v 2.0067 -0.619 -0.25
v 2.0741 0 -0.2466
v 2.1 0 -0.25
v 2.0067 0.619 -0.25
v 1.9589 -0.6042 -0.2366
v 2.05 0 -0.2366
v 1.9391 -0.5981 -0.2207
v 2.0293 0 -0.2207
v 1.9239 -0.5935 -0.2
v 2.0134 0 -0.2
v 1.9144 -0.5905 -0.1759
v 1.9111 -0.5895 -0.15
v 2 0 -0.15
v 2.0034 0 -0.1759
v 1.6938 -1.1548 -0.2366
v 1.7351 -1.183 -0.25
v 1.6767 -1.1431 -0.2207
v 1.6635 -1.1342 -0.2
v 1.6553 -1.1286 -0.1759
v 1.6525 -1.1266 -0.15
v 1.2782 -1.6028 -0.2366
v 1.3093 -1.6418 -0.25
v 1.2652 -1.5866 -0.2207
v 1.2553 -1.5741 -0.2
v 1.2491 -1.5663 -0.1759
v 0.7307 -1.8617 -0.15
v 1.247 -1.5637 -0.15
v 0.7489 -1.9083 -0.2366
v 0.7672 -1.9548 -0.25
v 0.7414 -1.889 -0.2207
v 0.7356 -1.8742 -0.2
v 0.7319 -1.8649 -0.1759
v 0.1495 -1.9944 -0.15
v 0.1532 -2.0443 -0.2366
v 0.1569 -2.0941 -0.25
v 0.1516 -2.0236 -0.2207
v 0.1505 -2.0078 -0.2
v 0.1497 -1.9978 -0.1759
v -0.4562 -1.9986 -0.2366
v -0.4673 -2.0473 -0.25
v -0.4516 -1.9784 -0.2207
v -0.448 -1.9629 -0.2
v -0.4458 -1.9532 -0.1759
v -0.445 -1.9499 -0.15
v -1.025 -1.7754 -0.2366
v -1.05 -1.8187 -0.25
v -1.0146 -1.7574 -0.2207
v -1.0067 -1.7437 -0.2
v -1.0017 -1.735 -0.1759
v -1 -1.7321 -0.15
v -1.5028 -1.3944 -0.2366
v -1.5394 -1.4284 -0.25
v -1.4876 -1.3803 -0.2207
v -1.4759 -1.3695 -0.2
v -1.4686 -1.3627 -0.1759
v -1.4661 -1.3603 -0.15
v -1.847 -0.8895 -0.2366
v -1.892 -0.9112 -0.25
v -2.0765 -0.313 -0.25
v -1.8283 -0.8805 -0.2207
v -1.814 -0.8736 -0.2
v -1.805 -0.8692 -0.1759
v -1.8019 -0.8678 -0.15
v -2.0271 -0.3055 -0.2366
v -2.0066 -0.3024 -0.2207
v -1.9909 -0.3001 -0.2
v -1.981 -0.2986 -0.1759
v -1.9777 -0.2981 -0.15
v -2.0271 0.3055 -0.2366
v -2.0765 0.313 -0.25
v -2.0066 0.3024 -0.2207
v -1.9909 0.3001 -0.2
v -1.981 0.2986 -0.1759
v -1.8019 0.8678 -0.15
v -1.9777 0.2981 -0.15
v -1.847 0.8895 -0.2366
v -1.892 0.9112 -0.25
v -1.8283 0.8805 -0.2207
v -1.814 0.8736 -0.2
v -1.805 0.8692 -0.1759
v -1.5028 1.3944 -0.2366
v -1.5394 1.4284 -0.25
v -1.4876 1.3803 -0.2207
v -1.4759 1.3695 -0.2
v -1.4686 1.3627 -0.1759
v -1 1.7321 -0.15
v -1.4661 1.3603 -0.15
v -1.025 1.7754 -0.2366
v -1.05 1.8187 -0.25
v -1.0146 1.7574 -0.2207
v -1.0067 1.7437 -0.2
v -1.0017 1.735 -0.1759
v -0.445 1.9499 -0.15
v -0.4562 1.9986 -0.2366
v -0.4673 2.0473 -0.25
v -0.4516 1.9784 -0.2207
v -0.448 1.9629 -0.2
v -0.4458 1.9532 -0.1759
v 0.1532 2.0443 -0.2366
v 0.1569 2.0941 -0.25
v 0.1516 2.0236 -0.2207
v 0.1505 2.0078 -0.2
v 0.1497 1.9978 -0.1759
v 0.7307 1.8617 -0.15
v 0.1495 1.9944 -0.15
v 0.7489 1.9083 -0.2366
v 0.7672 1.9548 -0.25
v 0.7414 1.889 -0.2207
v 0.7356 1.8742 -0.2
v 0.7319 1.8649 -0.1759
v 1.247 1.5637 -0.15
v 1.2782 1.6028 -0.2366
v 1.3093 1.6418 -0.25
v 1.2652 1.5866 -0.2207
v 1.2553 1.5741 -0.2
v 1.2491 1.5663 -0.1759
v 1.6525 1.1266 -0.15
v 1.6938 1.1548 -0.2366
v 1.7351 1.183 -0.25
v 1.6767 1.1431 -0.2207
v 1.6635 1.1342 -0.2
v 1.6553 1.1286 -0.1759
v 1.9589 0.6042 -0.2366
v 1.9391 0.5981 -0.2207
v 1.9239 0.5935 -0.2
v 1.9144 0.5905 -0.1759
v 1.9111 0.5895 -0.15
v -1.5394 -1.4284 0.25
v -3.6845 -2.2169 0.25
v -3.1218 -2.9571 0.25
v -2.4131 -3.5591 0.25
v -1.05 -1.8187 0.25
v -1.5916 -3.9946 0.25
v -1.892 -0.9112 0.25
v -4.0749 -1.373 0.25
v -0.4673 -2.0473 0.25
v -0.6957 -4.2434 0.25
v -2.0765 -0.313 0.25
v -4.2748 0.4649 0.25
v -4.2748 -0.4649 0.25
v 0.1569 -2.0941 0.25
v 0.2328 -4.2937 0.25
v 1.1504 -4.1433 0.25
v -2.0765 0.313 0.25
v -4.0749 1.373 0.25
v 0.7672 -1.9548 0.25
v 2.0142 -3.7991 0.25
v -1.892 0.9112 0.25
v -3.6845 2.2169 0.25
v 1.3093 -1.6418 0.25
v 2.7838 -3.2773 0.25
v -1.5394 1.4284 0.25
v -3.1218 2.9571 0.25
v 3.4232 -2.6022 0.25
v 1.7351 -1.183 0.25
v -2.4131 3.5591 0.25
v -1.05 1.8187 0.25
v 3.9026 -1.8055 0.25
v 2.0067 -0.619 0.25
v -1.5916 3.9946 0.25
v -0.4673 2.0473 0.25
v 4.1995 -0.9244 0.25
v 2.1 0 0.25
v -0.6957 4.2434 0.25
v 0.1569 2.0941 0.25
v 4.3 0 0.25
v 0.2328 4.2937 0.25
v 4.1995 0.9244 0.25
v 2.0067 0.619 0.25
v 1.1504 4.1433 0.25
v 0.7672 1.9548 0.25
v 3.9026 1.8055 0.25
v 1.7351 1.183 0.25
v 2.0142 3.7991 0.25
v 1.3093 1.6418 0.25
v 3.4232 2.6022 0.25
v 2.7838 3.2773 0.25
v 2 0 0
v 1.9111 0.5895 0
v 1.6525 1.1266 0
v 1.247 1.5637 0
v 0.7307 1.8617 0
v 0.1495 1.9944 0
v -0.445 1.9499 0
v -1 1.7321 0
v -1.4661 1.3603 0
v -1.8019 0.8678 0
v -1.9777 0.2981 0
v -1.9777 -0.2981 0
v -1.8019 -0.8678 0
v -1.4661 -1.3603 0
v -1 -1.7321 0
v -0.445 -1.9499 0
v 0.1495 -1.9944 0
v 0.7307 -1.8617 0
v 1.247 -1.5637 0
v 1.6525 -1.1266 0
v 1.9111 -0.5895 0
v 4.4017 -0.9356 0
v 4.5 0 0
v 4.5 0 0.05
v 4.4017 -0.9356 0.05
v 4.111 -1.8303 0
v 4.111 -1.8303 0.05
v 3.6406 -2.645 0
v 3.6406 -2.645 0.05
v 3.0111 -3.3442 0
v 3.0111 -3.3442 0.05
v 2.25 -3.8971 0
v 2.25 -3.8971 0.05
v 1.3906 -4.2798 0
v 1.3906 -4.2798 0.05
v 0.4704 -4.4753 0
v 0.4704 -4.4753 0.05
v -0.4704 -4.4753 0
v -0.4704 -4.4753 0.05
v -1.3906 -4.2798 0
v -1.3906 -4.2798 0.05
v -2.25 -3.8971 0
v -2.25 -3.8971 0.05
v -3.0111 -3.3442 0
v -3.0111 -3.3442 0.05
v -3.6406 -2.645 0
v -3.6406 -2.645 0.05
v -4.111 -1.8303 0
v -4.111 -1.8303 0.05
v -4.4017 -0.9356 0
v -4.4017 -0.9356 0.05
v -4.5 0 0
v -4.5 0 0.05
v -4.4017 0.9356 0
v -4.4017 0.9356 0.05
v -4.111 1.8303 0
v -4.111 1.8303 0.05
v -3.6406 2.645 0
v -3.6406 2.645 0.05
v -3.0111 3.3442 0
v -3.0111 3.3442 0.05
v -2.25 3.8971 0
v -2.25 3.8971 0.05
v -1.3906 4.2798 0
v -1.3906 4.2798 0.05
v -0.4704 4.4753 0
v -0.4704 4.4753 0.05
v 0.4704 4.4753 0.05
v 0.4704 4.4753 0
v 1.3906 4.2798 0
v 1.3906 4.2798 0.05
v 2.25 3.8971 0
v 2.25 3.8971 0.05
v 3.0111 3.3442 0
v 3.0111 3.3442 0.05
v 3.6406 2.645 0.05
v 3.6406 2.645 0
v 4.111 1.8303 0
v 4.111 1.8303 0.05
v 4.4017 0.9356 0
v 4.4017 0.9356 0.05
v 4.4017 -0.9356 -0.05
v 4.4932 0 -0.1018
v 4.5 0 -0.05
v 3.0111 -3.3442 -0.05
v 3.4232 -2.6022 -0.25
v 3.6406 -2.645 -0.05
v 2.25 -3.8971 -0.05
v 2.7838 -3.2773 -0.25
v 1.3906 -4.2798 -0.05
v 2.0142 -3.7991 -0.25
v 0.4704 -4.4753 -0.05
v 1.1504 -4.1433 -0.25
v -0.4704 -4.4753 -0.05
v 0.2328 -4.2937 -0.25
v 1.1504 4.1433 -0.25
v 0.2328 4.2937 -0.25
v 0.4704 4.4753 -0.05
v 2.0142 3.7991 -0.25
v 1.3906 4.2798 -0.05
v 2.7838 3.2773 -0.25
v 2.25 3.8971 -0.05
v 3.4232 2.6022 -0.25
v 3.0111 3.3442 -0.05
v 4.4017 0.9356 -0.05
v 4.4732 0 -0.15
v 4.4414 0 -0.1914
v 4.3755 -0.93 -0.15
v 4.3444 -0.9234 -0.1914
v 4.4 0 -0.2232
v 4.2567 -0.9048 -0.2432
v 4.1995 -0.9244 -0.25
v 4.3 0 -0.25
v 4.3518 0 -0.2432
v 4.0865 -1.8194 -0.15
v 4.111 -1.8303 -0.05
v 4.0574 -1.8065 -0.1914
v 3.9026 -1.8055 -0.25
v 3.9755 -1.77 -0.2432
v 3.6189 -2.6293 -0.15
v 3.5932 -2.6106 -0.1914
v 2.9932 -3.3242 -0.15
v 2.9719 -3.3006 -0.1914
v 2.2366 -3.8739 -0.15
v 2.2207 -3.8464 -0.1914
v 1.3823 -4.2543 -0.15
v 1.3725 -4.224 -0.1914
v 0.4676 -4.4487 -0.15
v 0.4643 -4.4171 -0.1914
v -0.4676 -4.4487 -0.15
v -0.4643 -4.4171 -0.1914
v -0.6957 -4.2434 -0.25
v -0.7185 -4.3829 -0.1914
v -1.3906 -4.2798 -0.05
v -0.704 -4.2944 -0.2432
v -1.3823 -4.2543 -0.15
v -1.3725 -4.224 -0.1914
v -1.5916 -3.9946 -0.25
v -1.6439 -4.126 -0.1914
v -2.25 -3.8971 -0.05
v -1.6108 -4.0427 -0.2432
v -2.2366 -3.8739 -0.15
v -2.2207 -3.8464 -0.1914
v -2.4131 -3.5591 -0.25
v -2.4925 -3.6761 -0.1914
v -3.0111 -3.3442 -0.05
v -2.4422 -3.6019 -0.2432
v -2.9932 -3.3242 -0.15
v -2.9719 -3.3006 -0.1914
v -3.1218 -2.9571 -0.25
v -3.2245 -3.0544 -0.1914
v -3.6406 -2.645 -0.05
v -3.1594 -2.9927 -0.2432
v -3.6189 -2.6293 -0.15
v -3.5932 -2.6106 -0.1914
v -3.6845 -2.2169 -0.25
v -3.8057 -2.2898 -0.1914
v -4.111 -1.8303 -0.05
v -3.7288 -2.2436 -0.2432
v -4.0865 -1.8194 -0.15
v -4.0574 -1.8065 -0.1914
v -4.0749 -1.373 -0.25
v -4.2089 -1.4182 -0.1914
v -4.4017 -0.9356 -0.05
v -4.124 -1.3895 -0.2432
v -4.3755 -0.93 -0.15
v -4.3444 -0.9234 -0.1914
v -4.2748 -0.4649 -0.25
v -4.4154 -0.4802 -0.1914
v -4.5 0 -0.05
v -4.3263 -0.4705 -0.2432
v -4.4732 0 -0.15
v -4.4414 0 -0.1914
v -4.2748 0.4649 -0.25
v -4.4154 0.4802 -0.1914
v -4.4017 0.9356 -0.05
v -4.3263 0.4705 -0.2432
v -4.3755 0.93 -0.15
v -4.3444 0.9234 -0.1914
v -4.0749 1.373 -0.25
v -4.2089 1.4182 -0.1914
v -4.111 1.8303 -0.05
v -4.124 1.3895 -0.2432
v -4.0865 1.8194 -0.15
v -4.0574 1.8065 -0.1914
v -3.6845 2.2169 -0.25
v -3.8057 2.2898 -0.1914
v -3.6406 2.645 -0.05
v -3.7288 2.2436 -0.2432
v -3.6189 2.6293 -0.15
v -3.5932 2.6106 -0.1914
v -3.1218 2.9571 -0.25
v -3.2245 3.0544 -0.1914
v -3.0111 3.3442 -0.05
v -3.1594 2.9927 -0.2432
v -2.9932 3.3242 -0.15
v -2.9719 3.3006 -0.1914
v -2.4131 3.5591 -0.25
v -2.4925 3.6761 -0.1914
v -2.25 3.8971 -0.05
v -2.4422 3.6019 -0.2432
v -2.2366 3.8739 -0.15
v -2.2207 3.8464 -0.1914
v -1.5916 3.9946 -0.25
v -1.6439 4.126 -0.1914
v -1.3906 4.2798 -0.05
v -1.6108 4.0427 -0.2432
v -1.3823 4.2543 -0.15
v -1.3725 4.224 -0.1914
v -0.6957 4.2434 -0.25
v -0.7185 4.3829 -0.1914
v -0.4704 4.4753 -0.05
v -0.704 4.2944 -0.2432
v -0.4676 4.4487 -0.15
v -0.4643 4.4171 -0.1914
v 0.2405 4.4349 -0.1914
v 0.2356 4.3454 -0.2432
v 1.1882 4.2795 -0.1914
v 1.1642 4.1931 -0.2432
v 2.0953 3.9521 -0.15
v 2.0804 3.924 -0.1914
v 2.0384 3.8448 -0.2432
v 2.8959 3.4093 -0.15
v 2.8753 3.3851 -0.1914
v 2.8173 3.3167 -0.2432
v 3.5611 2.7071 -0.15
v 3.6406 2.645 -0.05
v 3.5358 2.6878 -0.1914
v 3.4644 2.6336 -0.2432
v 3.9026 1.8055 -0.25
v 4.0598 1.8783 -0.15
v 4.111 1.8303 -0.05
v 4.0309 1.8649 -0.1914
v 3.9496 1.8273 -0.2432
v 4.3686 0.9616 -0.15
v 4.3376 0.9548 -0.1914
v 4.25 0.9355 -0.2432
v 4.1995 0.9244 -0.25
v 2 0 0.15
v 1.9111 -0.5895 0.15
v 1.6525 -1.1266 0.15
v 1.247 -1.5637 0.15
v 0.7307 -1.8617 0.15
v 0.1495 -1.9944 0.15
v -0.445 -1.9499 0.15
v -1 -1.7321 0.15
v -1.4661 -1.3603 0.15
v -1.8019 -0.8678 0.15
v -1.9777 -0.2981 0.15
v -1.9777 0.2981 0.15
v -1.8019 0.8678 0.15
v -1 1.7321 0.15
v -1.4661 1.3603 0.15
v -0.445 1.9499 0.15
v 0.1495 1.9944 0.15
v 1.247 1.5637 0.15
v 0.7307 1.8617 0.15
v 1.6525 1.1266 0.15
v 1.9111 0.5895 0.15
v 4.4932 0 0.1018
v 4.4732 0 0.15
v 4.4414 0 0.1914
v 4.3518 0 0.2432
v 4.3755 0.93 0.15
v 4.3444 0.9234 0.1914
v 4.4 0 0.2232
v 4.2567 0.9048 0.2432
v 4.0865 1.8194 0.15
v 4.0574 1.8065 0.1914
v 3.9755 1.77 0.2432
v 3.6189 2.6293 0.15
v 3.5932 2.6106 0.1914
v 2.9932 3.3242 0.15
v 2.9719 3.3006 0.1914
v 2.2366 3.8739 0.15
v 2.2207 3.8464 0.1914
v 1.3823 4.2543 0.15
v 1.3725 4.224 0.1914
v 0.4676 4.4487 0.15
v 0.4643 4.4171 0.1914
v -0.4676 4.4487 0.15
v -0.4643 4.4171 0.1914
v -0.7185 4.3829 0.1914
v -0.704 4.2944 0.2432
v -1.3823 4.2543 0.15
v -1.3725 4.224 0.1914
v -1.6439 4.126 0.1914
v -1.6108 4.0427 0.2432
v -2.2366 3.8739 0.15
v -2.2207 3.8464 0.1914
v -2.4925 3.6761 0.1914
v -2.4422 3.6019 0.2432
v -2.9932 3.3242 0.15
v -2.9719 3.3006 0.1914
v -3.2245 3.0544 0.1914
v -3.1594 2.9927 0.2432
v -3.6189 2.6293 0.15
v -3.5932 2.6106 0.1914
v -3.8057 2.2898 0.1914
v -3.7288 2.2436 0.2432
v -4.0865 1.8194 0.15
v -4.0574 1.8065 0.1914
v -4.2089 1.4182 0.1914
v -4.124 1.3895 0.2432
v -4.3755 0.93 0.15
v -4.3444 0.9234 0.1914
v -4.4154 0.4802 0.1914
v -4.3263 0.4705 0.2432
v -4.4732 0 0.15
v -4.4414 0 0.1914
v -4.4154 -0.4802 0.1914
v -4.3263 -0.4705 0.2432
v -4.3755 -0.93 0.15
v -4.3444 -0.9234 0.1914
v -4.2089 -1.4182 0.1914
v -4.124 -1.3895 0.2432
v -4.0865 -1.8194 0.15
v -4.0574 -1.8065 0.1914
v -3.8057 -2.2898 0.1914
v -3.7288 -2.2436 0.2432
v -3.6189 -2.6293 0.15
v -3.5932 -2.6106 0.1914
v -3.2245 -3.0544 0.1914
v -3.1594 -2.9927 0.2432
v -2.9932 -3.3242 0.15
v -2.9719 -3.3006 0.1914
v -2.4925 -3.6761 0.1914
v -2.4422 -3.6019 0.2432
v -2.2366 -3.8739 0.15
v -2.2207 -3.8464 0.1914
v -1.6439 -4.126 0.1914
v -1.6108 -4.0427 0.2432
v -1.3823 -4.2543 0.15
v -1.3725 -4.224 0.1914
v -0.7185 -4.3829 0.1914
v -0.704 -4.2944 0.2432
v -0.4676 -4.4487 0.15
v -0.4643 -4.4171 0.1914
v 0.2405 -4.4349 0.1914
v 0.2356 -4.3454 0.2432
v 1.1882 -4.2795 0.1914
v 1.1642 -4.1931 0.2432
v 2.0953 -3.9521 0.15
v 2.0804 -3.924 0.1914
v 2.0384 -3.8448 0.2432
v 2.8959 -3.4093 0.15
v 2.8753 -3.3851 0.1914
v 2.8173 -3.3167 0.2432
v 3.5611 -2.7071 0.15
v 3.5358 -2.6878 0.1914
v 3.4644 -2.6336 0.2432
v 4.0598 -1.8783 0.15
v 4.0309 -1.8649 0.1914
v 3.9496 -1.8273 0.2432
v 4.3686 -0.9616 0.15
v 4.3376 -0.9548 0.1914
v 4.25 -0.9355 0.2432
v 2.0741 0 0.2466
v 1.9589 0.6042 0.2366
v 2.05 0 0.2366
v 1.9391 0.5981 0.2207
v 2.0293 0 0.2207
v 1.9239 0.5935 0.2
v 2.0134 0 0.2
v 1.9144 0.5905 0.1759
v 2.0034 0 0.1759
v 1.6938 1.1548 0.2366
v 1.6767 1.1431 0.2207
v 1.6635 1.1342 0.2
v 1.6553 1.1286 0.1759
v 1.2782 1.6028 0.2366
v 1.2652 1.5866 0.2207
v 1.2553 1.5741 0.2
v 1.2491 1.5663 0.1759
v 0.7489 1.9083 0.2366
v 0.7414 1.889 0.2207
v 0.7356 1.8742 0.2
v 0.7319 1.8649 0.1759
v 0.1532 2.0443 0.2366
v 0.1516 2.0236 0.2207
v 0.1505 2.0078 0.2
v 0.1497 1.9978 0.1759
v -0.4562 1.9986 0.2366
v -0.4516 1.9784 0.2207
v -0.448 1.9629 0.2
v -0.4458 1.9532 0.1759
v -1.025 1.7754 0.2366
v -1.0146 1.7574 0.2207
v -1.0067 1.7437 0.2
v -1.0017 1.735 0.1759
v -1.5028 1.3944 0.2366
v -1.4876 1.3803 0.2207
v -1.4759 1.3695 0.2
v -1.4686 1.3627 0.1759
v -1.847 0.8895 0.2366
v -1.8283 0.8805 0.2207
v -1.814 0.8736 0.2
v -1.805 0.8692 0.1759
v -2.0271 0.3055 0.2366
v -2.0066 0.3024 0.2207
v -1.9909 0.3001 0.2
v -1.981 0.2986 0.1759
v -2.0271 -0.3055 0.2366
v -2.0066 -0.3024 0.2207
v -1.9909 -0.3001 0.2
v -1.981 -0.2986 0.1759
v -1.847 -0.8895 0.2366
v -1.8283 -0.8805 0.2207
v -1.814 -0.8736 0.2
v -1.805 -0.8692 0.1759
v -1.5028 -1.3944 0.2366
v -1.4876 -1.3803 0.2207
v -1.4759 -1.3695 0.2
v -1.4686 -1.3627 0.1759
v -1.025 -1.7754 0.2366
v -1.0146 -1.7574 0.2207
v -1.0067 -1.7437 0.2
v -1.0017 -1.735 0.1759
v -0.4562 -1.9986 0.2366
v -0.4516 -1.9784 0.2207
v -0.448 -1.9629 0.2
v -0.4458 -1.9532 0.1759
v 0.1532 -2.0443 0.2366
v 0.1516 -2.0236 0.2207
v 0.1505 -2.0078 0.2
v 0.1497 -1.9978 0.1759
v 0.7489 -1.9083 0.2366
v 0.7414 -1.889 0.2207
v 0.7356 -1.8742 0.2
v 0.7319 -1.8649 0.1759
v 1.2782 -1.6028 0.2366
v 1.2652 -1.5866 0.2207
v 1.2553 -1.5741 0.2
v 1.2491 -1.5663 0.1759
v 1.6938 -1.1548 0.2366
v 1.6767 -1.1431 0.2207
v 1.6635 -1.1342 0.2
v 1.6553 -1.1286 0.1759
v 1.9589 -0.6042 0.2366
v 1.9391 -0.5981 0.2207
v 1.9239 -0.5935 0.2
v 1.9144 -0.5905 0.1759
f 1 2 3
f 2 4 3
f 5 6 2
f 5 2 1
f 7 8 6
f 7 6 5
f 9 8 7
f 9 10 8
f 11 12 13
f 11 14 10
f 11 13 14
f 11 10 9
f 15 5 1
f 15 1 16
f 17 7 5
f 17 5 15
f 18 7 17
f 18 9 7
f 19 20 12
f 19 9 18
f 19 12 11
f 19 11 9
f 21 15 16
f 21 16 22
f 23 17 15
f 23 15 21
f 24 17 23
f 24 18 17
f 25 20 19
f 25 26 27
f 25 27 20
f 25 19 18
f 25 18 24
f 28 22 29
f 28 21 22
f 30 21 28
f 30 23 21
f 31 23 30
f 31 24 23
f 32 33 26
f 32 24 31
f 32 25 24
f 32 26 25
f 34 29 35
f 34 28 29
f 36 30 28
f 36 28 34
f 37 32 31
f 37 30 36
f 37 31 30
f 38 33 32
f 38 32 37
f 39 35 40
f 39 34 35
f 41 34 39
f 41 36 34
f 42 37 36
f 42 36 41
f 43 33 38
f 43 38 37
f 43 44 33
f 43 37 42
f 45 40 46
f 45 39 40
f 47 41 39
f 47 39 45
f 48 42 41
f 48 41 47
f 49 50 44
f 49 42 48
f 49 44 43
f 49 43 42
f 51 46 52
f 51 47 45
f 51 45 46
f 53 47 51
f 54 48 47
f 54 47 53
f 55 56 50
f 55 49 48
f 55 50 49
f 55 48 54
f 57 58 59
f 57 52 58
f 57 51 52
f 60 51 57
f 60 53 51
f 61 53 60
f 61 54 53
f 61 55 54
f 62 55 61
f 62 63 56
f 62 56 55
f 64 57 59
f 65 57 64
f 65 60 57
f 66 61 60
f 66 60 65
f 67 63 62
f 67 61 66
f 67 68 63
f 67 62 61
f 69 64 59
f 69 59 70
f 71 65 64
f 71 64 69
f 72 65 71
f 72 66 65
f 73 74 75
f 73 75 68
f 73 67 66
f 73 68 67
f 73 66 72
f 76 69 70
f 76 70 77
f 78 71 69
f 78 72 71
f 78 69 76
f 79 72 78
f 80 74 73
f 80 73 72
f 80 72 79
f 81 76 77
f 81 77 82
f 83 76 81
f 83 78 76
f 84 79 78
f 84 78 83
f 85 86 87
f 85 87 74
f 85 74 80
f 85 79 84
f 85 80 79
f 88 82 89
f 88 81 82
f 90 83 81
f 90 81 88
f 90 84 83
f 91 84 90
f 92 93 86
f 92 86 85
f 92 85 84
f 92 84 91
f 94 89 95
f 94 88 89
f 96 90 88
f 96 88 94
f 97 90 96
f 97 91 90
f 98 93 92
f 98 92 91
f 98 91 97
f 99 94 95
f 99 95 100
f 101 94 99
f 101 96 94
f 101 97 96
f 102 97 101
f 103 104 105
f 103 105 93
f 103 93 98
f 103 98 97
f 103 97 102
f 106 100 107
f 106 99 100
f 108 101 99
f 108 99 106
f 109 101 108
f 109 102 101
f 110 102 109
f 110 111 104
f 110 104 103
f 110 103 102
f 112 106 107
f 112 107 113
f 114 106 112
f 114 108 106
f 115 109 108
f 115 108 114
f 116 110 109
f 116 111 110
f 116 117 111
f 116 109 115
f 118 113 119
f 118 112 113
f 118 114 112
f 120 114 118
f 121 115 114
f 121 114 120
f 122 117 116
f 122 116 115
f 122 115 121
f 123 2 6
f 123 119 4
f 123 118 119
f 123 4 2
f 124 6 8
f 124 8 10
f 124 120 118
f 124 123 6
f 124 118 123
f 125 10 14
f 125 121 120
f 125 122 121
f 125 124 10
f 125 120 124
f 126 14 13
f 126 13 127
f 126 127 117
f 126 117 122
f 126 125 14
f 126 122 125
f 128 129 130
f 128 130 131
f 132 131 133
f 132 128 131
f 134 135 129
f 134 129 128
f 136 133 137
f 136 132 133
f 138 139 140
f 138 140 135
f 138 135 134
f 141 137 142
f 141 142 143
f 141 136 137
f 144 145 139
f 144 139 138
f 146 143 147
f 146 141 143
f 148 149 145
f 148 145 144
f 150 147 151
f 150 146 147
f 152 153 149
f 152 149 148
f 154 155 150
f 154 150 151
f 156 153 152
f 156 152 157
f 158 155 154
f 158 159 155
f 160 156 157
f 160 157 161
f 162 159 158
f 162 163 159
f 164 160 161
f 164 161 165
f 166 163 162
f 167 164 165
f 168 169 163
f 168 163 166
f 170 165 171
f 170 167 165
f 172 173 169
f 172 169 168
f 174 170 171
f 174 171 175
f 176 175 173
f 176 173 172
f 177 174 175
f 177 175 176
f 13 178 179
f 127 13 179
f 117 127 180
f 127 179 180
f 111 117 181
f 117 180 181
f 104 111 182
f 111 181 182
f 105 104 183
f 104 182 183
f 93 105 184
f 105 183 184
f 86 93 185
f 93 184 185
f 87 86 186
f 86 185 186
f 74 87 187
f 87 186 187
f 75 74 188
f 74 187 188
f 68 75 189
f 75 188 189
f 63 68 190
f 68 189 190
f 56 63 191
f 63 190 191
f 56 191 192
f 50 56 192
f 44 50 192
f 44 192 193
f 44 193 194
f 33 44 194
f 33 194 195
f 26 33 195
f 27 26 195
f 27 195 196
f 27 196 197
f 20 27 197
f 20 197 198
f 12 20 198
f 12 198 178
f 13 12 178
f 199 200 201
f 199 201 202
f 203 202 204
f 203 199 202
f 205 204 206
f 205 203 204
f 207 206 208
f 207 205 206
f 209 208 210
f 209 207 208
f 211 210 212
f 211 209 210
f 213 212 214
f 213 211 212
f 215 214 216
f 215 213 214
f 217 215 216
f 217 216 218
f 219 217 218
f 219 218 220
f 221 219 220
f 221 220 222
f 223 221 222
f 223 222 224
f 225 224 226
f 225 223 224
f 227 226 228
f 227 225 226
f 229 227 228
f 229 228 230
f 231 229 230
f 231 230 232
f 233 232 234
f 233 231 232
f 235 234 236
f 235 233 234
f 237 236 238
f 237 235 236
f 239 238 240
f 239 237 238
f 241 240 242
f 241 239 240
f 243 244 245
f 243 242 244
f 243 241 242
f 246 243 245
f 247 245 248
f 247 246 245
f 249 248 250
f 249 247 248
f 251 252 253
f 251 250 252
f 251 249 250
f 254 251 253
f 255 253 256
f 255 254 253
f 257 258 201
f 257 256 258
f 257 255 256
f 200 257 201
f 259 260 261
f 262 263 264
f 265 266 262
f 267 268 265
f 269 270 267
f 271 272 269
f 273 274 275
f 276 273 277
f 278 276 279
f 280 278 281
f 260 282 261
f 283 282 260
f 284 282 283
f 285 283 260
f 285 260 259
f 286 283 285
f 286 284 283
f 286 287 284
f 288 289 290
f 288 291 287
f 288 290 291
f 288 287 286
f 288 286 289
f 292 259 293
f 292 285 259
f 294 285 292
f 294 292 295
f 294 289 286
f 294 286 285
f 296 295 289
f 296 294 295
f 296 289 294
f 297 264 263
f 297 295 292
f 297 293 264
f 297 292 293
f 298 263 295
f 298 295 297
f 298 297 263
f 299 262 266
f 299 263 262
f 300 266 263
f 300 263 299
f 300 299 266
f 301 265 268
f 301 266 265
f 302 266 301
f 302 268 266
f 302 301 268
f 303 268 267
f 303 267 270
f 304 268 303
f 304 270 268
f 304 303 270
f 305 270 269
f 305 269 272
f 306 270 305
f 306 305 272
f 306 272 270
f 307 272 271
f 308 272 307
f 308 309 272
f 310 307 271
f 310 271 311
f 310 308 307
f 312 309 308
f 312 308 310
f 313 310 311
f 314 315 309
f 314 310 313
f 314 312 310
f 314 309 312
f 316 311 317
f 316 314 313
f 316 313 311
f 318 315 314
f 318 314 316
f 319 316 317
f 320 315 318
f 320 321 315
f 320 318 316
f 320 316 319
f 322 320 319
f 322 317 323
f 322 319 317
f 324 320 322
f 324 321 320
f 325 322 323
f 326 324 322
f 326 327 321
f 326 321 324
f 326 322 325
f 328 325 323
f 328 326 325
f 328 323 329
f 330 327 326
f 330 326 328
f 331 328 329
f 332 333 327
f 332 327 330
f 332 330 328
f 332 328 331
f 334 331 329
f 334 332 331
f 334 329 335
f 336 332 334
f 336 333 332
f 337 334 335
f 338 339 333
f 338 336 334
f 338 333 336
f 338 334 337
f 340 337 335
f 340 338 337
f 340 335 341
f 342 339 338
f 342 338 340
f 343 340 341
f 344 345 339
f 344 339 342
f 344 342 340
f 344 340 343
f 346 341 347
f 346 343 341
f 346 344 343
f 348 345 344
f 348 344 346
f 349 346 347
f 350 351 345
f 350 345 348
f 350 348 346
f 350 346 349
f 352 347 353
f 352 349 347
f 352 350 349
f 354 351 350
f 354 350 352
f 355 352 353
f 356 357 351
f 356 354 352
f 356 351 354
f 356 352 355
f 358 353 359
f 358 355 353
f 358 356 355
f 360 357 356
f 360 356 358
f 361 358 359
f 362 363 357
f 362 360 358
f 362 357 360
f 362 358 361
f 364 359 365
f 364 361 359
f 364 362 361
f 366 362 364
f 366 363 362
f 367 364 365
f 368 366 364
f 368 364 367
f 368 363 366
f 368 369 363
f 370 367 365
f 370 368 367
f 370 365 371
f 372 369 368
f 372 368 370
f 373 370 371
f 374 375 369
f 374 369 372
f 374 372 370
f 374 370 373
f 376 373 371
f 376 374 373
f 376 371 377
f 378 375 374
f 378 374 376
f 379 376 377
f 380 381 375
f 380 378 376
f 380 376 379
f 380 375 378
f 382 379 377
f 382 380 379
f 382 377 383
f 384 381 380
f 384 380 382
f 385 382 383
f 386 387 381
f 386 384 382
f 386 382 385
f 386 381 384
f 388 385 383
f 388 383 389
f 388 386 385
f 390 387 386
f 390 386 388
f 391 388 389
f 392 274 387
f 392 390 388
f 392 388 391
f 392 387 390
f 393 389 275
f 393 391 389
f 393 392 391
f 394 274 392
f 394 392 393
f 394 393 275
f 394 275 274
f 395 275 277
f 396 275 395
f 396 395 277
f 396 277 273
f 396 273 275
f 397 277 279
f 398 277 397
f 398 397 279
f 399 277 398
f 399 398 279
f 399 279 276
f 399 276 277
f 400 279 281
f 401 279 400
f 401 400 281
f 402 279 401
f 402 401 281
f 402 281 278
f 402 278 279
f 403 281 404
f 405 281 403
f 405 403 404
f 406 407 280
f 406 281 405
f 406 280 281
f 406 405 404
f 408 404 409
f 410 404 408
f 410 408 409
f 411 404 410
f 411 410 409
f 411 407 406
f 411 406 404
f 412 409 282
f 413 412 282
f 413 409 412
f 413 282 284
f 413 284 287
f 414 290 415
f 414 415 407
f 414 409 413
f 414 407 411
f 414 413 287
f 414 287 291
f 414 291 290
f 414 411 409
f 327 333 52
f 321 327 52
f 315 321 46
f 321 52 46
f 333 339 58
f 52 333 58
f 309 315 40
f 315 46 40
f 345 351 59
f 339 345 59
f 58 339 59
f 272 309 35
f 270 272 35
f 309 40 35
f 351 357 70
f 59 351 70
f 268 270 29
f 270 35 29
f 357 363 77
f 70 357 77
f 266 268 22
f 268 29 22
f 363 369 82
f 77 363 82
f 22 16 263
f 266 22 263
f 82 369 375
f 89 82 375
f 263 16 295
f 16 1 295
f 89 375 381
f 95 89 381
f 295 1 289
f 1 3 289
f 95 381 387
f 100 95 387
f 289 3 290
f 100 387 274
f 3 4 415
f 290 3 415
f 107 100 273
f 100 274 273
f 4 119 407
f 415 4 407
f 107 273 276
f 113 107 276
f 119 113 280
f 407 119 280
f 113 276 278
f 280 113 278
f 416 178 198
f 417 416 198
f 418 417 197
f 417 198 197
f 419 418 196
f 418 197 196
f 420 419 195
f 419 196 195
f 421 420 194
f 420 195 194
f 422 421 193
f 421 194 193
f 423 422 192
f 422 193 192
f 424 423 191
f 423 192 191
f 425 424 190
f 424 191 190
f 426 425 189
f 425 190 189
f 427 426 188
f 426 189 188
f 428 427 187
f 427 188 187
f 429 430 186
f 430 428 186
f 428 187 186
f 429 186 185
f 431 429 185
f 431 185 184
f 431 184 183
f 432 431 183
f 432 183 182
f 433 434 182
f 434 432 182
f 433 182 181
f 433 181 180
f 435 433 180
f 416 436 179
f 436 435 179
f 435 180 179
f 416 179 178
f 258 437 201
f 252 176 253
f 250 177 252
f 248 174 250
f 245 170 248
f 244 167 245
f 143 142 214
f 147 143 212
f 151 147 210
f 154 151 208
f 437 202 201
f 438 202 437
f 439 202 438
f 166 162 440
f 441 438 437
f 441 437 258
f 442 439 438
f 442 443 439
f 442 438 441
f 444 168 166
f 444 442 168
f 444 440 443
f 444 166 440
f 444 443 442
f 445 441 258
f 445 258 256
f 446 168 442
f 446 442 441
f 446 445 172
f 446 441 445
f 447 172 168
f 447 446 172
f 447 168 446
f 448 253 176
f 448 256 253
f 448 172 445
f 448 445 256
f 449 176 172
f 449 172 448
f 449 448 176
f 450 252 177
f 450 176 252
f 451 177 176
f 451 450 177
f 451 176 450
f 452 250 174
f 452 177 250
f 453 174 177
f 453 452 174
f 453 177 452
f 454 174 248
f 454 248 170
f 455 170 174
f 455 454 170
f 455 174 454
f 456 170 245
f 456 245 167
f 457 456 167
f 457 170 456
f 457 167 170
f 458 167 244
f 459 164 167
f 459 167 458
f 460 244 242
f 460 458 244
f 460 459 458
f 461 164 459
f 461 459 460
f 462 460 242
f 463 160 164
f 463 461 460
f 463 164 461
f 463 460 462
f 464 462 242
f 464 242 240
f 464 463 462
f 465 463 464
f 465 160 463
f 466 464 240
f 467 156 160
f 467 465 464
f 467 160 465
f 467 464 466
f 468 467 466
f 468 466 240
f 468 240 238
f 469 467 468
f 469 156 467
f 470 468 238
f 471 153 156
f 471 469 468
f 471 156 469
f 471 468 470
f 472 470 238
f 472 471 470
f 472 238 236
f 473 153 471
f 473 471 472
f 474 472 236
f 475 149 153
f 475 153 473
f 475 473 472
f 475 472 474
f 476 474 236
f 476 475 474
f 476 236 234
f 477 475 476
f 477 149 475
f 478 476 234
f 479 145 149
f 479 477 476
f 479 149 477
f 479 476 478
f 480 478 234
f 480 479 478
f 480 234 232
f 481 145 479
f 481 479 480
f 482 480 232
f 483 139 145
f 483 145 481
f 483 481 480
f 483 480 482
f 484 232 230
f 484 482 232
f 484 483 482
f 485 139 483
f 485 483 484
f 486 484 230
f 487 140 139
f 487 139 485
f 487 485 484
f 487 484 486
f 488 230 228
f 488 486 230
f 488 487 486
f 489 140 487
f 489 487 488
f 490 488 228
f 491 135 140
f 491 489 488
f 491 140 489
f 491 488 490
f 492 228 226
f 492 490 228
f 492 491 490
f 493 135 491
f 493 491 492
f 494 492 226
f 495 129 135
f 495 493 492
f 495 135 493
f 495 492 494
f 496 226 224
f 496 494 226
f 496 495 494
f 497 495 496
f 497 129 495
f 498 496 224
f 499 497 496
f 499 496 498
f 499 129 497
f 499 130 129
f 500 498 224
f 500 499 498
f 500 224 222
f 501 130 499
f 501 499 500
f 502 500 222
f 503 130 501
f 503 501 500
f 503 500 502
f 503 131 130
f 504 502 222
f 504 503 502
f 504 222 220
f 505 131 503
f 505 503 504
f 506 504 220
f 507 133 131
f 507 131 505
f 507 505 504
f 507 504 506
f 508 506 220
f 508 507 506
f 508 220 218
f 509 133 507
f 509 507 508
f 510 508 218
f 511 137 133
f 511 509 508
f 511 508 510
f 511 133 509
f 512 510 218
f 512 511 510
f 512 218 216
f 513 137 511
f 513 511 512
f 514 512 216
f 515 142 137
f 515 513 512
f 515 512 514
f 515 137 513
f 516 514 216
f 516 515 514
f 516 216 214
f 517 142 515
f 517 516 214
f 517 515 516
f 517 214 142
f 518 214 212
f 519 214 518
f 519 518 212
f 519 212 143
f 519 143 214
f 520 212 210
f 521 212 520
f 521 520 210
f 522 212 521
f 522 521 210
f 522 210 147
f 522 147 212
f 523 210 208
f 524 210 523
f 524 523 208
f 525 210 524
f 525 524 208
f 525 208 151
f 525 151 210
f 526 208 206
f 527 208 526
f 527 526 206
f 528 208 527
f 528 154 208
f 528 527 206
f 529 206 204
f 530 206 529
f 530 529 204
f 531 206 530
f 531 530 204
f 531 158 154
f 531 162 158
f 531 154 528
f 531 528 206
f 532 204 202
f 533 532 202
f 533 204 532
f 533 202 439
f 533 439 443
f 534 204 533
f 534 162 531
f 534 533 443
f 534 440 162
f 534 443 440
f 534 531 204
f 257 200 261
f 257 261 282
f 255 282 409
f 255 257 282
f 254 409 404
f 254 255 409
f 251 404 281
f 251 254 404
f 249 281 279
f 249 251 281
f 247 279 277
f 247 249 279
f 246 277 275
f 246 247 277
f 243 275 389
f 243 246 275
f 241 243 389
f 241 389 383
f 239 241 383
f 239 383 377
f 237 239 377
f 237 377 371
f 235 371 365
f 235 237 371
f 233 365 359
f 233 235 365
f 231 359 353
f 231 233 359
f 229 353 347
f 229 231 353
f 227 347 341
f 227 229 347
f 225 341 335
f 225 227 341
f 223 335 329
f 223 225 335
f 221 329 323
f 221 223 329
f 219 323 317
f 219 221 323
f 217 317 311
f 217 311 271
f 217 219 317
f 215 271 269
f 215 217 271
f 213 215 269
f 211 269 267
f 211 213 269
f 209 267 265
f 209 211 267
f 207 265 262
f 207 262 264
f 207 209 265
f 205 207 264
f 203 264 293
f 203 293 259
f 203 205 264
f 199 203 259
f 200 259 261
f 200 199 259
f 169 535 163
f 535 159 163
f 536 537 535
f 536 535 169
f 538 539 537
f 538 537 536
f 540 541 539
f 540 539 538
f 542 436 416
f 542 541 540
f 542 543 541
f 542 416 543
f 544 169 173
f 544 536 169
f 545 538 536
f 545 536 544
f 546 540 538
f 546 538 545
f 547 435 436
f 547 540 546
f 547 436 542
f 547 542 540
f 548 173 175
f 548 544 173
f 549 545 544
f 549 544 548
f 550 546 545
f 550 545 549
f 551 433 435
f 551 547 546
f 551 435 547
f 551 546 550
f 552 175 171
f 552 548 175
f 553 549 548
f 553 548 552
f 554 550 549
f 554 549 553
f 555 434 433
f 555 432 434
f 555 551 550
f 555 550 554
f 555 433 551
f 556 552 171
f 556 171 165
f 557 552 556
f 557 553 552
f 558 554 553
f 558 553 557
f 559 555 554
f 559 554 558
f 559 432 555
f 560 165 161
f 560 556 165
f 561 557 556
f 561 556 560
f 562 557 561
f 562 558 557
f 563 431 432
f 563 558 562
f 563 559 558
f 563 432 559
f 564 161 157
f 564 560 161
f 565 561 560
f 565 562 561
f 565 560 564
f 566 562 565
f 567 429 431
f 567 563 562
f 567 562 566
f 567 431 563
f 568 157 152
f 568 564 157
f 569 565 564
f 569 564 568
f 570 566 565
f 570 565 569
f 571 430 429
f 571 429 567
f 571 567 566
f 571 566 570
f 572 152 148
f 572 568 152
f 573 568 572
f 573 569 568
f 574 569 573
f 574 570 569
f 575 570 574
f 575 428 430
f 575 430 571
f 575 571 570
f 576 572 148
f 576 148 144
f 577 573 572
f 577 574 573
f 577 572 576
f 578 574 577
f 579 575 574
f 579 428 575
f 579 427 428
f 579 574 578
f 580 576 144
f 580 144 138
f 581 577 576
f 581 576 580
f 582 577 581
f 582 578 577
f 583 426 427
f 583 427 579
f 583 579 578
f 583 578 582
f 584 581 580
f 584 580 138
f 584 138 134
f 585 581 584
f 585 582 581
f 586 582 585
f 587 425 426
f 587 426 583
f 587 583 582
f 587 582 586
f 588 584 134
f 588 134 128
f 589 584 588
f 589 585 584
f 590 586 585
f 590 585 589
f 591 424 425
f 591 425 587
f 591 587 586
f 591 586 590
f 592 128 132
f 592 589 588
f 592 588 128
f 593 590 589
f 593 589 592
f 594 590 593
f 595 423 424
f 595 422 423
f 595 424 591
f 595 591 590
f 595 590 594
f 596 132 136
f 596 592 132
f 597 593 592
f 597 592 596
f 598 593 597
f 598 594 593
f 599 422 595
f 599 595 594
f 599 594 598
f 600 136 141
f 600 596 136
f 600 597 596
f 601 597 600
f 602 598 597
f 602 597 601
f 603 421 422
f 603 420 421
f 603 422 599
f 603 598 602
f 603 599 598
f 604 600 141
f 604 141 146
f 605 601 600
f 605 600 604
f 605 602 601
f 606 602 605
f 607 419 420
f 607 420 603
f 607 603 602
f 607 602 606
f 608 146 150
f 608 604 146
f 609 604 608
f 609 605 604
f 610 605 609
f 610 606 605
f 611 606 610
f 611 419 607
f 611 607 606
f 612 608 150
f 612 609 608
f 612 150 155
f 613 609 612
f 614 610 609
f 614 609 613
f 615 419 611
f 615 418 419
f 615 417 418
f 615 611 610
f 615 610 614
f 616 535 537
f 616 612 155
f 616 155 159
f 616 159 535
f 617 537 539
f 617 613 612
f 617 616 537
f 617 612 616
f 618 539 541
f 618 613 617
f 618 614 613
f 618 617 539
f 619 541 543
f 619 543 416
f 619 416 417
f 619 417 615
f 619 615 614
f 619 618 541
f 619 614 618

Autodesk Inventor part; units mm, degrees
ref_plane "YZ Plane" through (0, 0, 0) normal (1, 0, 0) x (0, 1, 0)
ref_plane "XZ Plane" through (0, 0, 0) normal (0, 1, 0) x (-1, 0, 0)
ref_plane "XY Plane" through (0, 0, 0) normal (0, 0, 1) x (1, 0, 0)
sketch "Sketch1" plane through (0, 0, 0) normal (0, 0, 1) x (1, 0, 0)
  circle A0 centre (0, 0) radius 2
  circle A1 centre (0, 0) radius 4.5
  dimension "Di" = 4
  dimension "D" = 9
extrude "Extrusion1" add sketch "Sketch1" along normal mid plane 0.5
fillet "Fillet1" radius 0.2 2 edges at (-4.5, 0, 0.25) (-4.5, 0, -0.25)
fillet "Fillet2" radius 0.1 2 edges at (-2, 0, 0.25) (-2, 0, -0.25)
properties part number "Anilha_M4"
